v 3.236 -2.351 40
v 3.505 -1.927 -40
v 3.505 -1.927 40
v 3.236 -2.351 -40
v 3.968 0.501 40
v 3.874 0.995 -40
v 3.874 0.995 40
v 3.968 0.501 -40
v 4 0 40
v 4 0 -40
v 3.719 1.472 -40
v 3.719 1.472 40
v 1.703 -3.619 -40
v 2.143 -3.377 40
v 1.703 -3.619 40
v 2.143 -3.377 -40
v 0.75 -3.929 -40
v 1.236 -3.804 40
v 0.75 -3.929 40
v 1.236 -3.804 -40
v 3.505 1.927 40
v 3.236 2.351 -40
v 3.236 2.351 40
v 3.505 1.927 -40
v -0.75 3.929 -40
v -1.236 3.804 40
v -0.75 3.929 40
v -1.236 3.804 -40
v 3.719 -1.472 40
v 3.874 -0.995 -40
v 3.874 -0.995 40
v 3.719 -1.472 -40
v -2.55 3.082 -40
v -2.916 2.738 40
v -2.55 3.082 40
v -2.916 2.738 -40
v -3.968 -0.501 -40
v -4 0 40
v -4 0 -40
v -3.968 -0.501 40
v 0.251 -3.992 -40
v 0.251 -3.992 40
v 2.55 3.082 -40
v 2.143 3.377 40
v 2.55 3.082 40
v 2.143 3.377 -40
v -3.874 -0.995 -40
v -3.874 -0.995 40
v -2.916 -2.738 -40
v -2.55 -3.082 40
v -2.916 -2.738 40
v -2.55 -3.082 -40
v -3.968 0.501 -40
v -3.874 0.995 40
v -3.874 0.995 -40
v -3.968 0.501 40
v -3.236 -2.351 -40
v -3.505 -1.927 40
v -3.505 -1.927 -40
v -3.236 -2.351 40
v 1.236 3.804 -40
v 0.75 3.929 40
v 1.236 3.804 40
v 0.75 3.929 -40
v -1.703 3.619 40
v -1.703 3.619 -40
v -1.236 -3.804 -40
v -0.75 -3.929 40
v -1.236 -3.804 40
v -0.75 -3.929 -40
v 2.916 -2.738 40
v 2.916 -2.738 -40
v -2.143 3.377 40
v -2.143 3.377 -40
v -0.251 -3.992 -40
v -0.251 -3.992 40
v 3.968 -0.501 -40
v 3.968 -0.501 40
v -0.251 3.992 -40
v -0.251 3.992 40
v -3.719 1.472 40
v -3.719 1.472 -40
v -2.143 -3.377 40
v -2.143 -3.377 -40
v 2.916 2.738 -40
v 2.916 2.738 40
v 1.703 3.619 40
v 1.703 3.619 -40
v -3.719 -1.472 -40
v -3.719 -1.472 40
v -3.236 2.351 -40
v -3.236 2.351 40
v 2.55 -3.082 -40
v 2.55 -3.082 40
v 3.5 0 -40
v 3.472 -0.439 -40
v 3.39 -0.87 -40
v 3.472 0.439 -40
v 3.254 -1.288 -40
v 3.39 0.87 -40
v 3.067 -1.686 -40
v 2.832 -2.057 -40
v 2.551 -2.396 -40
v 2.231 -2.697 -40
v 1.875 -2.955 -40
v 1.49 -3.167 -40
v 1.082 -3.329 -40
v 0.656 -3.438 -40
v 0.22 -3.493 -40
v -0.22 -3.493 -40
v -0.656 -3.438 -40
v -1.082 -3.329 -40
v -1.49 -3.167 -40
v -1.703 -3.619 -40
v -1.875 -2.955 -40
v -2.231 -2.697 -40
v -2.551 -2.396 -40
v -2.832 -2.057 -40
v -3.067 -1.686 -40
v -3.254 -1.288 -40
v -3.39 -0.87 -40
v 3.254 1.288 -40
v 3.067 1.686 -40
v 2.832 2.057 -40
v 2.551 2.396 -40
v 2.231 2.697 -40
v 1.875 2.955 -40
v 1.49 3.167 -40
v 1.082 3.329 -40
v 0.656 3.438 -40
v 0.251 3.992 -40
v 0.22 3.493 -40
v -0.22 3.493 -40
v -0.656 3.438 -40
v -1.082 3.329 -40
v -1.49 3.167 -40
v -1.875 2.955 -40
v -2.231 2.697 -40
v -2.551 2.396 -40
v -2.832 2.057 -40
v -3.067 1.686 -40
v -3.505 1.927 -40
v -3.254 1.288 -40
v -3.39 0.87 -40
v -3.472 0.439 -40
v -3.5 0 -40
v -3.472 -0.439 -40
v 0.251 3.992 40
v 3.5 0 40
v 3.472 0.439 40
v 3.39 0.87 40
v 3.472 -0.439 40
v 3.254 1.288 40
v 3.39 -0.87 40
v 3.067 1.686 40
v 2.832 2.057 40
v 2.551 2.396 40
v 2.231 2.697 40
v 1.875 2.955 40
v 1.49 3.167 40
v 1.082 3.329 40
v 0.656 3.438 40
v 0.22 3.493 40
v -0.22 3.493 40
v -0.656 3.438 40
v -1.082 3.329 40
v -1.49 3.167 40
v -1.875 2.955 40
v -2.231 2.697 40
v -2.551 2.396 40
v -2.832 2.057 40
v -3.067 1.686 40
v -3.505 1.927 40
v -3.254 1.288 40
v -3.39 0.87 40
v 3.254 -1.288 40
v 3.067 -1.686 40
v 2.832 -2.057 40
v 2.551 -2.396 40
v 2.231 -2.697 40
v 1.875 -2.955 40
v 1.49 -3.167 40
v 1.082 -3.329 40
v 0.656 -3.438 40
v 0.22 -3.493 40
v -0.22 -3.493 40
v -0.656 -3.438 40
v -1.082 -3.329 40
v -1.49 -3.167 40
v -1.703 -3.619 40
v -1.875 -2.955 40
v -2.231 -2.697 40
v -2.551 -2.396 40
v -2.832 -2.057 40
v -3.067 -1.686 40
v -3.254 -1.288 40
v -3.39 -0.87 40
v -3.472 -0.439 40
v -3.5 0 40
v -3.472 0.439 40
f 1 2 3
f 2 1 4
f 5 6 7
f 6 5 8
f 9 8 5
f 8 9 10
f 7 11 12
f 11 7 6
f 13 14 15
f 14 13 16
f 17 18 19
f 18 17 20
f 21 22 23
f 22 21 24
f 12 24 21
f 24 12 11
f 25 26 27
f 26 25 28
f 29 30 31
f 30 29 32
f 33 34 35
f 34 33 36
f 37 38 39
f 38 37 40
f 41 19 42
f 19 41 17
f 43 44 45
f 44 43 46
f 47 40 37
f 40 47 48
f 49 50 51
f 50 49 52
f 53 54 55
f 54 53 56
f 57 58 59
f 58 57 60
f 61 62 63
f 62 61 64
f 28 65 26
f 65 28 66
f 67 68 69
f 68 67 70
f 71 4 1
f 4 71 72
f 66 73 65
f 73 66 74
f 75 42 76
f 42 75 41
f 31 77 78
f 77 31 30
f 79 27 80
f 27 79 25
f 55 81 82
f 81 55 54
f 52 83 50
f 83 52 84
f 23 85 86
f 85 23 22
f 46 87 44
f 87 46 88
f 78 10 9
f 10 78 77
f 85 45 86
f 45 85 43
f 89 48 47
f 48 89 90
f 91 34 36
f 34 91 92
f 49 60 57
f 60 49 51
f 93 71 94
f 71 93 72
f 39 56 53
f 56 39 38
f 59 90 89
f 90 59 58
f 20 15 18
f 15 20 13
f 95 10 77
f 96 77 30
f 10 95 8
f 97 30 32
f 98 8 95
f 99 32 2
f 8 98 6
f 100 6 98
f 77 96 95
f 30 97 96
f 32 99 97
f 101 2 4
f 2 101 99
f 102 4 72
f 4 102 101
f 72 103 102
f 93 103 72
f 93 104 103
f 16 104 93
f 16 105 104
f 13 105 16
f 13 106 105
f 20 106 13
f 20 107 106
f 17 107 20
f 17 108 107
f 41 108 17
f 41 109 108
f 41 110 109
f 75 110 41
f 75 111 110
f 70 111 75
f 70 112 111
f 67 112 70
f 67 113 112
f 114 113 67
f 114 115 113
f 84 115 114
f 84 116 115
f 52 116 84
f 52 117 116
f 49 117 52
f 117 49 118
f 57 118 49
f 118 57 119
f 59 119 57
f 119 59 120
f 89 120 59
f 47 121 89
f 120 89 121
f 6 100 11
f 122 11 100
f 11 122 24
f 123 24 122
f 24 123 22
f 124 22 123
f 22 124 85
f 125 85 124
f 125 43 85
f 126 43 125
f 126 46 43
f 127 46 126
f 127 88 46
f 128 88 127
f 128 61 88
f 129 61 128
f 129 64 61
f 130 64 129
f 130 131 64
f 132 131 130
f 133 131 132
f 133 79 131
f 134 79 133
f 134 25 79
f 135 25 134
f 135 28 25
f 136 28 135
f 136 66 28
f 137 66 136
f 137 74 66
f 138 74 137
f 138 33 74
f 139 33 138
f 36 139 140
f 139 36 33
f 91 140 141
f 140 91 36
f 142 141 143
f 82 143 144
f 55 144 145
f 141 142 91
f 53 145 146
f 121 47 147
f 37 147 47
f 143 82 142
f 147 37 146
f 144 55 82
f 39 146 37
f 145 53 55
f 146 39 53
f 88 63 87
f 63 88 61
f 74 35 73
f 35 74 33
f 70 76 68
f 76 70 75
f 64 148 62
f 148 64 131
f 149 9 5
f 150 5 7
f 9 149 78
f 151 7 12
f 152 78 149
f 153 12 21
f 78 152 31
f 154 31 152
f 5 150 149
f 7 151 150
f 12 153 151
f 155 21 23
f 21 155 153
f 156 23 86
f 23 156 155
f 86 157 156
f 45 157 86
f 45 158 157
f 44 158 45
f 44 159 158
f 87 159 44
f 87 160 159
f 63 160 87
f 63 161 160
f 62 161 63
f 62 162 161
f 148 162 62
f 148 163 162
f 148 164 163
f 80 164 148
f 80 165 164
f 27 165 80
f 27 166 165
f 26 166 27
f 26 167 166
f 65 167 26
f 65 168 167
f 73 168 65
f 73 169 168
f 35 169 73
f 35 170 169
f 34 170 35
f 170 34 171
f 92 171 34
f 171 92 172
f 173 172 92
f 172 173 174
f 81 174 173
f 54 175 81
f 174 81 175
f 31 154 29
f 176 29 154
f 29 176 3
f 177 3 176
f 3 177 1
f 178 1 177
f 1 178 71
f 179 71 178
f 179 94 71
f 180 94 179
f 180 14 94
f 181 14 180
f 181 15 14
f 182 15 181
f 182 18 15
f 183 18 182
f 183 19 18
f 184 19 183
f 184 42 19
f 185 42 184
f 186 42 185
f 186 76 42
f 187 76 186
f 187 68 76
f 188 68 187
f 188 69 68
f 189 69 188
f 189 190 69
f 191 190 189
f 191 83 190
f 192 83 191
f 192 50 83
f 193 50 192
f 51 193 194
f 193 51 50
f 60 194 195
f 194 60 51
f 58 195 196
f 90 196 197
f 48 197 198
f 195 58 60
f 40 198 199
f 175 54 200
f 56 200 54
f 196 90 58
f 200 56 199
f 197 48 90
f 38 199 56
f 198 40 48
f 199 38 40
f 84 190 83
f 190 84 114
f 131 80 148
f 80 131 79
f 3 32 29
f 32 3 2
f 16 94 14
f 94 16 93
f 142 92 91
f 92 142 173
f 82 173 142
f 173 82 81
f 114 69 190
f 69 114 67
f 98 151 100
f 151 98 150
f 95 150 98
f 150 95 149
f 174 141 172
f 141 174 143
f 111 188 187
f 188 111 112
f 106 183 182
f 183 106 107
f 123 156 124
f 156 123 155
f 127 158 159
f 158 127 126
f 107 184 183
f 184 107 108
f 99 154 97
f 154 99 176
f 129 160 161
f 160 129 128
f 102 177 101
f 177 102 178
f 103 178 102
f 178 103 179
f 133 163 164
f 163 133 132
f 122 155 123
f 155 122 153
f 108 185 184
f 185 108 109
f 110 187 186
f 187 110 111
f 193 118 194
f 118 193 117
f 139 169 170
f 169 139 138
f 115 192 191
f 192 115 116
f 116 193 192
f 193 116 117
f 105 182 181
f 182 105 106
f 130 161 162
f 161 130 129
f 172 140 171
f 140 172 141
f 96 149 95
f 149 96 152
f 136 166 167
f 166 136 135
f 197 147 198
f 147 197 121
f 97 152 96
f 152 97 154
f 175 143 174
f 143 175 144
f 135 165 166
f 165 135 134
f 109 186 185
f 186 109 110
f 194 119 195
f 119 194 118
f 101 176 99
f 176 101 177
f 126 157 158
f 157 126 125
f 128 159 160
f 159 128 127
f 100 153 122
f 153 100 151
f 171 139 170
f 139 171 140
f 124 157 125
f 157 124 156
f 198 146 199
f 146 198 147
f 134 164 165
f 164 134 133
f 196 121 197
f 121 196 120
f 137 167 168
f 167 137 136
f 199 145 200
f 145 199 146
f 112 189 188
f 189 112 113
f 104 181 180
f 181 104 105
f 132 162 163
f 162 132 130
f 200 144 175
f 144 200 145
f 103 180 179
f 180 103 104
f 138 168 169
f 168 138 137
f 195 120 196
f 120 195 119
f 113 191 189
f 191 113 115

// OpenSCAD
$fn = 50;


difference() {
	union() {
		translate(v = [0, 0, -40.0000000000]) {
			cylinder(h = 80, r = 4.0000000000);
		}
	}
	union() {
		translate(v = [0, 0, -100.0000000000]) {
			cylinder(h = 200, r = 3.5000000000);
		}
	}
}
